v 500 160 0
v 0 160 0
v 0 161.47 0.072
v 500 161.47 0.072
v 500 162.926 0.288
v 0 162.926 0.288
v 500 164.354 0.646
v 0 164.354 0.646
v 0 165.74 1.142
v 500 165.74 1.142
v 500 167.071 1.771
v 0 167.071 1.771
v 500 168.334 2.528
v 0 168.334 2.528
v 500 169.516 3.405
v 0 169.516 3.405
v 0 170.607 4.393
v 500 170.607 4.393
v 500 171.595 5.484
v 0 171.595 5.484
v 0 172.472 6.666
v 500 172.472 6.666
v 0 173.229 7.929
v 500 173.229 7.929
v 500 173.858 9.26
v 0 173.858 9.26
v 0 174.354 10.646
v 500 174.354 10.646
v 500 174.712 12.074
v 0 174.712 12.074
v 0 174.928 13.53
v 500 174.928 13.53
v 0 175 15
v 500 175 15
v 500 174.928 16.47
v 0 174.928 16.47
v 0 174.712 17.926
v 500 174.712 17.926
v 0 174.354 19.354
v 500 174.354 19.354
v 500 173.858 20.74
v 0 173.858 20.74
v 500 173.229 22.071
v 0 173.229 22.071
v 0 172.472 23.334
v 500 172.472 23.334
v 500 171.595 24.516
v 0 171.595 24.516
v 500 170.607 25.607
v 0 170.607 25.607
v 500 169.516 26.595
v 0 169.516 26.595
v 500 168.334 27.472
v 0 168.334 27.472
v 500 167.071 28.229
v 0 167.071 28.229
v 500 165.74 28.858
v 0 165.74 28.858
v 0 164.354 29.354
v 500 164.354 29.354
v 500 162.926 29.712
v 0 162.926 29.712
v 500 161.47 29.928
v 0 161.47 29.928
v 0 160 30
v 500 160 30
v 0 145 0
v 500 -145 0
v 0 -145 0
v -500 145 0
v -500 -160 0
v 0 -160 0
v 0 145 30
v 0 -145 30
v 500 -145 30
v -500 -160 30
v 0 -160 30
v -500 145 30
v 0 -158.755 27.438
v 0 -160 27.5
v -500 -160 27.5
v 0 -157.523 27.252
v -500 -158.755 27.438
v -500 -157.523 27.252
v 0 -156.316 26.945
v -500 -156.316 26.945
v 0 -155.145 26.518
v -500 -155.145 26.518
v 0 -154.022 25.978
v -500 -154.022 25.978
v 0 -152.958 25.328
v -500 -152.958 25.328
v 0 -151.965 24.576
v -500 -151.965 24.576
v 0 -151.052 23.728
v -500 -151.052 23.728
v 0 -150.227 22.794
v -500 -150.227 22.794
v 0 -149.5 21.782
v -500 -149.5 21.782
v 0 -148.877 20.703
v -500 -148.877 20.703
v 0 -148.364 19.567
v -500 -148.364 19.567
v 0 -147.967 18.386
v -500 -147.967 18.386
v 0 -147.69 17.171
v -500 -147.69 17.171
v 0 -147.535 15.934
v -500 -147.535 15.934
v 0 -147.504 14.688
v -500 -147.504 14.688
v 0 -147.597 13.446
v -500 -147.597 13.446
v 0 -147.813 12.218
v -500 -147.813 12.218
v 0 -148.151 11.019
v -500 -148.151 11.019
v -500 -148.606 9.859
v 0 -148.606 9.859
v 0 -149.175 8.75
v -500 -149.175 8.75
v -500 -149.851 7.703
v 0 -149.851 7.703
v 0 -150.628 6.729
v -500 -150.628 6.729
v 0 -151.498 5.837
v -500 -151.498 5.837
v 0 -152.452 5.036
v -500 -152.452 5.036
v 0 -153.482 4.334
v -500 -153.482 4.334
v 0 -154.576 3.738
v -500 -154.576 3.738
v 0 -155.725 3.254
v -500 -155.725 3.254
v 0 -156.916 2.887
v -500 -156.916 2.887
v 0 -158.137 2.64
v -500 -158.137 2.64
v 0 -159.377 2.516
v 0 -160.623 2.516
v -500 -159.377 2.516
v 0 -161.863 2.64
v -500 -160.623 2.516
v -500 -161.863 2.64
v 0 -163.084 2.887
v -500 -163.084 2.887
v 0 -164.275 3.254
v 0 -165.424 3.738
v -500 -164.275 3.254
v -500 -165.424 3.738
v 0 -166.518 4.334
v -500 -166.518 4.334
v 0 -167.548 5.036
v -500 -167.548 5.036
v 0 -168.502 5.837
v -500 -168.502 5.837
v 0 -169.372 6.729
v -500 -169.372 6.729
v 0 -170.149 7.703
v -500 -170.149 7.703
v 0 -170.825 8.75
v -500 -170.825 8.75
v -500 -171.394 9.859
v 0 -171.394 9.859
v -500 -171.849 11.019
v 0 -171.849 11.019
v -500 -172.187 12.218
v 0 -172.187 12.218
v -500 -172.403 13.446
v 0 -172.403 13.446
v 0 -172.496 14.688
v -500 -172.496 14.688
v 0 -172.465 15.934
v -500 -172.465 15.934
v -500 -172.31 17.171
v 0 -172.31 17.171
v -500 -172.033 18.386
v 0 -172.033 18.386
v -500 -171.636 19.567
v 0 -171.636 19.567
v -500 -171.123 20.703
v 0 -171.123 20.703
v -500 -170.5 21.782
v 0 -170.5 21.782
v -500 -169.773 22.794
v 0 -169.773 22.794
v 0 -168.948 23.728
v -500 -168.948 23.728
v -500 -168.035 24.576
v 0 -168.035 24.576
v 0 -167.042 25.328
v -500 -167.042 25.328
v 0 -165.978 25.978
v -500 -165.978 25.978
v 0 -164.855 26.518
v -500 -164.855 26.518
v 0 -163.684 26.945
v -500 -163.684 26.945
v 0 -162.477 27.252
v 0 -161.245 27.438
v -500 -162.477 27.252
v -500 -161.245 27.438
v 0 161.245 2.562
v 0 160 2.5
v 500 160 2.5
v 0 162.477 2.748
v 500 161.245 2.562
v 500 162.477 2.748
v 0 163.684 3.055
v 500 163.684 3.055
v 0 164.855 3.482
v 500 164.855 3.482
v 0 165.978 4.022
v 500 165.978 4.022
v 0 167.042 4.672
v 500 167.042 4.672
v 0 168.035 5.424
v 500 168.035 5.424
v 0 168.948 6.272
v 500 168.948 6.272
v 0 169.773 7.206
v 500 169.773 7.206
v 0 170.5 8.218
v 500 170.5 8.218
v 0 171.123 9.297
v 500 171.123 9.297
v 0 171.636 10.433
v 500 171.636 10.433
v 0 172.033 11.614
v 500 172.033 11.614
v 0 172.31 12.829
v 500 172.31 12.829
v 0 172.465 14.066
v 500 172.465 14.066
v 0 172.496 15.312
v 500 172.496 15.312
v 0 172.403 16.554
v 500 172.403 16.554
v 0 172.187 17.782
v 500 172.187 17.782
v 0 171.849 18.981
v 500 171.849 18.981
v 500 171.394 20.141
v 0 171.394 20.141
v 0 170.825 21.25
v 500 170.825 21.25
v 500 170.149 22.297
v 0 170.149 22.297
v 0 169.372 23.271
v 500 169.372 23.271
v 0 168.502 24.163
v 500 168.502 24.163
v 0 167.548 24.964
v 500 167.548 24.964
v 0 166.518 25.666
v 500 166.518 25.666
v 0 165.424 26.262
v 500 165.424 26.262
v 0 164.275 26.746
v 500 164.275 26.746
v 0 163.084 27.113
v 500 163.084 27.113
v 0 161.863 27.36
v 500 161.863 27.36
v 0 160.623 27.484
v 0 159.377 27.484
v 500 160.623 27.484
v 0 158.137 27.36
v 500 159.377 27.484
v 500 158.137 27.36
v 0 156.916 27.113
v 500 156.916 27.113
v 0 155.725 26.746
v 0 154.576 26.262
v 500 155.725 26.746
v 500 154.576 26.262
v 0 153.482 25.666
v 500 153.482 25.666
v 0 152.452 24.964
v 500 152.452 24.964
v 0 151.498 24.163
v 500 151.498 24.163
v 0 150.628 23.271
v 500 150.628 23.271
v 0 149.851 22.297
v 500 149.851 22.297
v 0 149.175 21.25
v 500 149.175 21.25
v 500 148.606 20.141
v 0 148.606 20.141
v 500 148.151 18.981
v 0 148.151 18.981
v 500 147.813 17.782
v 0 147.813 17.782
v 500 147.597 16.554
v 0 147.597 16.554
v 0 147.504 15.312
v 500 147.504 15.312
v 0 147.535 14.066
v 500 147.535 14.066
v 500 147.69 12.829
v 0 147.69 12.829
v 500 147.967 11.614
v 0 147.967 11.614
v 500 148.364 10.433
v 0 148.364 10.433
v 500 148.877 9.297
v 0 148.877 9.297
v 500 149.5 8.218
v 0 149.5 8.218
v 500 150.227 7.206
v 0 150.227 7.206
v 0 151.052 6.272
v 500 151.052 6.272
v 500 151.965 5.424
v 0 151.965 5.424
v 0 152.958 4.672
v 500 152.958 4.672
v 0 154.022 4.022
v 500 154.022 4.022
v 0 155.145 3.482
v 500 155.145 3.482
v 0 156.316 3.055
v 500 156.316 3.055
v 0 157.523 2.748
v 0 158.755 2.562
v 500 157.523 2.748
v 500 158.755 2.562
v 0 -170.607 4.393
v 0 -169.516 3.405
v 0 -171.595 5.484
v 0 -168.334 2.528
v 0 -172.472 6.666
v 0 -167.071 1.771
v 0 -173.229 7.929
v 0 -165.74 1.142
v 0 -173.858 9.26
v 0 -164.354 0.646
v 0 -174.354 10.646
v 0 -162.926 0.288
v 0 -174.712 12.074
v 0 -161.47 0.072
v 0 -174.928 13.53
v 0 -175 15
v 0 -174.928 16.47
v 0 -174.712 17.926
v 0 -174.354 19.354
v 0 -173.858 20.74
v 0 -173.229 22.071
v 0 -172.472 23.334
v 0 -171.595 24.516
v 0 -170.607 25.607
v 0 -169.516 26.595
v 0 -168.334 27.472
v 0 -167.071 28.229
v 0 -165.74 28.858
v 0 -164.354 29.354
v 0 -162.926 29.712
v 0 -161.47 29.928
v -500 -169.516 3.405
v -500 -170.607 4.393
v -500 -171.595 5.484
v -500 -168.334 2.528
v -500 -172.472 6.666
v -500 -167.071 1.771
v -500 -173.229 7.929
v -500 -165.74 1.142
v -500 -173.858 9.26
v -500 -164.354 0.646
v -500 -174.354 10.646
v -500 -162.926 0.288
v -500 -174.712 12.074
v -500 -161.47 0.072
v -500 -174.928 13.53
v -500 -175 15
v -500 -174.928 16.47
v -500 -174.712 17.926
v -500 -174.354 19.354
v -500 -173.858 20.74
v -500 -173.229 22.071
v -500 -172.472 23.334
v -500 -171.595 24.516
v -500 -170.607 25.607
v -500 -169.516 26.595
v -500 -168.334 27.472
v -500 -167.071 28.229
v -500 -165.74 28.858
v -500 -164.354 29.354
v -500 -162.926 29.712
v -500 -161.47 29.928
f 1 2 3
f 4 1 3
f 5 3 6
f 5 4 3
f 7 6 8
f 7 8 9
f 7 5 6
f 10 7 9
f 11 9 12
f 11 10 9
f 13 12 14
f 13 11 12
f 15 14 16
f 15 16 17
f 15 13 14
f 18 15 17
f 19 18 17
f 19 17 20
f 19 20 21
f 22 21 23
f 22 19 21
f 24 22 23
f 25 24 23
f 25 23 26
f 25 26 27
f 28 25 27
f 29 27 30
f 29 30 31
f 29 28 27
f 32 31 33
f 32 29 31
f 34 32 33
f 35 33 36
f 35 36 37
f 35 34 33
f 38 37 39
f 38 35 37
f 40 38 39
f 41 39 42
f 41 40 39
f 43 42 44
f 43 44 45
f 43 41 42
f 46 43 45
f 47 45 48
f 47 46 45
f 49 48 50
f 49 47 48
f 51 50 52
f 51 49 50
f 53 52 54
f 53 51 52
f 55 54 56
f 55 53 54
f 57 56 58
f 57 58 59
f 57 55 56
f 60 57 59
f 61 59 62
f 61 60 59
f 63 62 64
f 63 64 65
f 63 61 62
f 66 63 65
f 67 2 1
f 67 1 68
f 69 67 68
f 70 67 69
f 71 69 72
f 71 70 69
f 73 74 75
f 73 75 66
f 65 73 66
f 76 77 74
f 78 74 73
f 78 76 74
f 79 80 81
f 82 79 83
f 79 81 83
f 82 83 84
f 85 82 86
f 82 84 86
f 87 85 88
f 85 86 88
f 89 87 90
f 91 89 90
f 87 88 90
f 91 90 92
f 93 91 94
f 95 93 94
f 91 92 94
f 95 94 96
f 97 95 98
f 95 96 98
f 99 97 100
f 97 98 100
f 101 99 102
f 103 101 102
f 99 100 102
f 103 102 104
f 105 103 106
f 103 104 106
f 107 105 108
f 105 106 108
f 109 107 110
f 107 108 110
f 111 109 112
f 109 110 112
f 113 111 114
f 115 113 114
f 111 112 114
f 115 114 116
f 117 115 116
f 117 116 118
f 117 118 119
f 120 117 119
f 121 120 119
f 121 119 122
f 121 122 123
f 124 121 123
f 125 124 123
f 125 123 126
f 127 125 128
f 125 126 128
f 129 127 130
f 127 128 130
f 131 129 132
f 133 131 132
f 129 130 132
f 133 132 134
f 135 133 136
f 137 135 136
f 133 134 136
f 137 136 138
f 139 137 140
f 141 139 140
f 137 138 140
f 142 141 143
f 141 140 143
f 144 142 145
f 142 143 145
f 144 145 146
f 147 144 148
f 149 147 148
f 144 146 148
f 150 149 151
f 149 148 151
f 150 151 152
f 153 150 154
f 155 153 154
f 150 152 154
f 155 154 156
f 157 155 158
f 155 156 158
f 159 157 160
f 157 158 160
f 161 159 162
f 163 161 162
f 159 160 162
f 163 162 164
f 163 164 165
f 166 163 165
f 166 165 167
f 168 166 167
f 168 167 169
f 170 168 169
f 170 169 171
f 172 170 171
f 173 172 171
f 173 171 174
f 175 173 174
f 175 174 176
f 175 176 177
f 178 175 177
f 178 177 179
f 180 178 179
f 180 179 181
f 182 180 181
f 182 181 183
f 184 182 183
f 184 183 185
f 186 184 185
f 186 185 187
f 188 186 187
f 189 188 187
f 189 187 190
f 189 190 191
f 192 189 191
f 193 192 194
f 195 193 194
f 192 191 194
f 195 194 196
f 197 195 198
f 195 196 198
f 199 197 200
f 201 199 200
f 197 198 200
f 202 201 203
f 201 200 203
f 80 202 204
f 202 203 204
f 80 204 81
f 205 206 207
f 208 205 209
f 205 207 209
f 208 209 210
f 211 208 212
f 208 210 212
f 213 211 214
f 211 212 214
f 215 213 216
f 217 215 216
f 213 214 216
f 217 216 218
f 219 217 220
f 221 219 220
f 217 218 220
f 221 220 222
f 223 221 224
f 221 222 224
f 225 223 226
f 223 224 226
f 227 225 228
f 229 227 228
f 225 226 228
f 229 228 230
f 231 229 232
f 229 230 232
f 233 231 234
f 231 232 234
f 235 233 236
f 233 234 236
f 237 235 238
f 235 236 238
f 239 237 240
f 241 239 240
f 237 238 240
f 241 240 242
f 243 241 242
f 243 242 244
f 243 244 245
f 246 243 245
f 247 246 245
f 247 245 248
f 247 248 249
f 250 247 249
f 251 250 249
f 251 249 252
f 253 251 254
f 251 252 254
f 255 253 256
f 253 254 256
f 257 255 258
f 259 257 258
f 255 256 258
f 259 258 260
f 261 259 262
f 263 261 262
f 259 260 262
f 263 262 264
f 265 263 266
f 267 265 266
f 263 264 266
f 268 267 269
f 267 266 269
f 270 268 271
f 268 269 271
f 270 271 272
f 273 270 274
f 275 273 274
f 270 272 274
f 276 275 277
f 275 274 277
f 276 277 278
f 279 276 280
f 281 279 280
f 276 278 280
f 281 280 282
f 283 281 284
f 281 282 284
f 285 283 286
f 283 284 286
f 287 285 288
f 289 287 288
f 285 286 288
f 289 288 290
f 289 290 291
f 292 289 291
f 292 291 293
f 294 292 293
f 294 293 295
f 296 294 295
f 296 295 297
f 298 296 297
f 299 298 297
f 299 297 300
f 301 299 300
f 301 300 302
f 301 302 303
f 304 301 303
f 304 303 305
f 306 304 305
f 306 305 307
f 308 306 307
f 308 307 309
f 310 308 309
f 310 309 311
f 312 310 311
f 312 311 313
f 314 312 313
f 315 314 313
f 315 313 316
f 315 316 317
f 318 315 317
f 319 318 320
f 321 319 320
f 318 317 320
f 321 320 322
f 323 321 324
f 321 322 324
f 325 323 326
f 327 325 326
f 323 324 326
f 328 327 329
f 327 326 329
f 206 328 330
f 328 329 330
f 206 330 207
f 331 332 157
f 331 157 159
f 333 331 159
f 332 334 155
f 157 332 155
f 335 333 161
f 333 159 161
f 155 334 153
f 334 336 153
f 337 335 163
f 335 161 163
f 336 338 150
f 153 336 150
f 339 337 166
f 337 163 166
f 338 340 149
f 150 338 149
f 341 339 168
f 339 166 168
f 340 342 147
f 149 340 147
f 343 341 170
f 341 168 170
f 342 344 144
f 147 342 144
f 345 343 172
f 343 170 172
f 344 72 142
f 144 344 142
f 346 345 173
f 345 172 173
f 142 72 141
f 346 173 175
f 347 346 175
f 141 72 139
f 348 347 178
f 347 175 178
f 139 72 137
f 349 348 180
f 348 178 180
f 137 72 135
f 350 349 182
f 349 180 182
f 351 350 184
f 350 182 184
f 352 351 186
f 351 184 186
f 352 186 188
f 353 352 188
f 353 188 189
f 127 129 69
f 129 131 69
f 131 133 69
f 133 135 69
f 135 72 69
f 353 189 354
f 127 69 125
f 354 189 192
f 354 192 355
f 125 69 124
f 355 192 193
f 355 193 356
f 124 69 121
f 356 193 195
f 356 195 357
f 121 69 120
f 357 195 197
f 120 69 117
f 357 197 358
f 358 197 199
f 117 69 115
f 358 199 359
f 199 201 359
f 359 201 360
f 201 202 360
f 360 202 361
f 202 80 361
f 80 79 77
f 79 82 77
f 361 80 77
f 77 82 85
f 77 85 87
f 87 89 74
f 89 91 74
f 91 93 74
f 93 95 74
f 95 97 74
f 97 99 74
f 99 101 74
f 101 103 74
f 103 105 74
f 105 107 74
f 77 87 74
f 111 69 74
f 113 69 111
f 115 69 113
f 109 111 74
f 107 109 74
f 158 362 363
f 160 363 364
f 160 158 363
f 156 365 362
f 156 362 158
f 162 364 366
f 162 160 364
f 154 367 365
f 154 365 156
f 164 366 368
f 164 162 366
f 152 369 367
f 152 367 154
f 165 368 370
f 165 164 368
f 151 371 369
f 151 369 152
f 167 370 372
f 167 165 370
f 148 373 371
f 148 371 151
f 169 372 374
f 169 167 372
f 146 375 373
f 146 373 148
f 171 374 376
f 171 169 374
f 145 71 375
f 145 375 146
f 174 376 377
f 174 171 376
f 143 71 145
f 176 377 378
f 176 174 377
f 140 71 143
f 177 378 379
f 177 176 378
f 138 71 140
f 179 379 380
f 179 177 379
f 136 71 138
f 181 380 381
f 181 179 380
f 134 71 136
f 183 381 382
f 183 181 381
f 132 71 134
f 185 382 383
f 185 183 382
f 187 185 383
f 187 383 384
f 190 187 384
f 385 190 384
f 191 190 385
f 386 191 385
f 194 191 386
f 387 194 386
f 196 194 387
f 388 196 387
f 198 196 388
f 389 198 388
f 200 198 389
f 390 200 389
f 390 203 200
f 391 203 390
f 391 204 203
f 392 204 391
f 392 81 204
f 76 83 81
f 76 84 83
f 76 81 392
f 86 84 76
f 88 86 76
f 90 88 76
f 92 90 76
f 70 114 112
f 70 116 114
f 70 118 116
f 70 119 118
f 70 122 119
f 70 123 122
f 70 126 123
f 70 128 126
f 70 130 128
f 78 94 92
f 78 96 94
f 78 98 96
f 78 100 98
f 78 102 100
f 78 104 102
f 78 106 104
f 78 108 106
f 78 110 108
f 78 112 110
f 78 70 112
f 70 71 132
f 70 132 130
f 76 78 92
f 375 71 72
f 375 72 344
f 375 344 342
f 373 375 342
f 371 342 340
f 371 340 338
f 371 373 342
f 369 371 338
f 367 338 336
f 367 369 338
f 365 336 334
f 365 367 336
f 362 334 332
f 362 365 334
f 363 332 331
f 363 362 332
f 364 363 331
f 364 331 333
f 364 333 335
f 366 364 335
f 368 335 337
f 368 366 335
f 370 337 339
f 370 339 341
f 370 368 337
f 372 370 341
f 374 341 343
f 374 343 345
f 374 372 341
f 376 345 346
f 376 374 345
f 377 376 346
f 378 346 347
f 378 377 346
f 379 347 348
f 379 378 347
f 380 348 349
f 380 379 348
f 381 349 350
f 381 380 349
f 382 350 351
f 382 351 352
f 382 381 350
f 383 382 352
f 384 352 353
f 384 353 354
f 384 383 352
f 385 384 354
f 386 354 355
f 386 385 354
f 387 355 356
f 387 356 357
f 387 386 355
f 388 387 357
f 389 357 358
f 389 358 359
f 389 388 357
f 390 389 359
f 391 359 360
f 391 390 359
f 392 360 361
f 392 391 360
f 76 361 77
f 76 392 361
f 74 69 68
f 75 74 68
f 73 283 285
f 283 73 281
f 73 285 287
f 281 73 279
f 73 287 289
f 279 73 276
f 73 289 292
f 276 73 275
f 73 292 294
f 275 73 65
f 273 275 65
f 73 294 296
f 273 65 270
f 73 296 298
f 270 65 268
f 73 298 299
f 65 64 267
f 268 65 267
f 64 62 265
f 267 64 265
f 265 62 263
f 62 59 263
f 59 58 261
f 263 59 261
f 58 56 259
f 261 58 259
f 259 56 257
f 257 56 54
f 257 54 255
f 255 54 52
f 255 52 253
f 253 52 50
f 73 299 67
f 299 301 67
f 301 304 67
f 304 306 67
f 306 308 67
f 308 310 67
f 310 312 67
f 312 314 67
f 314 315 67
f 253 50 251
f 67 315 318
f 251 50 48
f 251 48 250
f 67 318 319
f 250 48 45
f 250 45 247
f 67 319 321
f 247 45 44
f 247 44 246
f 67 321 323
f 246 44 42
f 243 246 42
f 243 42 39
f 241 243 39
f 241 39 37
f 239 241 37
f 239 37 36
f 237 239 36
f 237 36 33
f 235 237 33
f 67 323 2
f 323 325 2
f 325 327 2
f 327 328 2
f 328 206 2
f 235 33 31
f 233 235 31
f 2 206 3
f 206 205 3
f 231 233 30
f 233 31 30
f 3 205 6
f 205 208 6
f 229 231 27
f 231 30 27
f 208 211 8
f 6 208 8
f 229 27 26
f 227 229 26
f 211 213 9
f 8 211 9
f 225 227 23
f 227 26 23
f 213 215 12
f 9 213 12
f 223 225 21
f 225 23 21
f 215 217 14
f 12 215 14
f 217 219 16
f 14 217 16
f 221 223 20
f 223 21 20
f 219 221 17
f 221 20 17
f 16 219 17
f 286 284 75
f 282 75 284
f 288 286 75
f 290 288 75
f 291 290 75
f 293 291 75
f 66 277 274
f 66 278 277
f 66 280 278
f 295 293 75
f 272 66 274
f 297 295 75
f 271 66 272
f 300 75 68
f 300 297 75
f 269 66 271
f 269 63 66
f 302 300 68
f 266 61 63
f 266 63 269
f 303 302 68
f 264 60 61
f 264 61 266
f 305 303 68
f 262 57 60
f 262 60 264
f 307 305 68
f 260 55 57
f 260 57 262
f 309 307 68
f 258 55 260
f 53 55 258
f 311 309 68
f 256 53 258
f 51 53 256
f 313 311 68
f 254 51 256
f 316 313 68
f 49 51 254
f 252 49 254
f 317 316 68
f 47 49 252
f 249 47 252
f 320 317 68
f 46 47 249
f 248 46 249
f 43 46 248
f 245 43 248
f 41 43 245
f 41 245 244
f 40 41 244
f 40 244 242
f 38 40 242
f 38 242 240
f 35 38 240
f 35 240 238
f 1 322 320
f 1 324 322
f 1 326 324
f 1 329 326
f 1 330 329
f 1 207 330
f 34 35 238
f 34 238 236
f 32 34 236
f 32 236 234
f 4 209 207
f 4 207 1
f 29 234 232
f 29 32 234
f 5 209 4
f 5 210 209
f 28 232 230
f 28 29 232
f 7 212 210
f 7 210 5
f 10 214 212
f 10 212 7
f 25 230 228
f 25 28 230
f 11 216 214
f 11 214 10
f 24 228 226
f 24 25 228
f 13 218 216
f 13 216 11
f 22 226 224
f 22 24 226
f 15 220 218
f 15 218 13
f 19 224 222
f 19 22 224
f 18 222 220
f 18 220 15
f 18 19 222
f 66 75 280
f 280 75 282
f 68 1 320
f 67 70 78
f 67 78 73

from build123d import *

# Parameters (mm, degrees)
SKETCH1_W           = 1000
SKETCH1_H           = 290
BOSS_EXTRUDE1_DEPTH = 30
SKETCH2_R           = 15
SKETCH2_R_2         = 12.5
BOSS_EXTRUDE2_DEPTH = 500
SKETCH3_R           = 15
SKETCH3_R_2         = 12.5
BOSS_EXTRUDE3_DEPTH = 500


with BuildPart() as part:
    # Sketch1 → Boss-Extrude1 (new body)
    with BuildSketch(Plane.XY):
        Rectangle(SKETCH1_W, SKETCH1_H)
    extrude(amount=BOSS_EXTRUDE1_DEPTH)

    # Sketch2 → Boss-Extrude2 (add)
    with BuildSketch(Plane(origin=(500, 0, 0), x_dir=(0, 0, -1), z_dir=(1, 0, 0))):
        with Locations((-15, 160)):
            Circle(SKETCH2_R)
        with Locations((-15, 160)):
            Circle(SKETCH2_R_2, mode=Mode.SUBTRACT)
        with BuildLine():
            ThreePointArc((-15, 145), (-25.606601718, 149.393398282), (-30, 160))
            Line((-30, 160), (-30, 145))
            Line((-30, 145), (-15, 145))
        make_face()
        with BuildLine():
            Line((0, 145), (0, 160))
            ThreePointArc((0, 160), (-4.393398282, 149.393398282), (-15, 145))
            Line((-15, 145), (0, 145))
        make_face()
    extrude(amount=-BOSS_EXTRUDE2_DEPTH)

    # Sketch3 → Boss-Extrude3 (add)
    with BuildSketch(Plane.ZY.offset(500)):
        with BuildLine():
            Line((0, -145), (0, -160))
            ThreePointArc((0, -160), (4.393398282, -149.393398282), (15, -145))
            Line((15, -145), (0, -145))
        make_face()
        with Locations((15, -160)):
            Circle(SKETCH3_R)
        with Locations((15, -160)):
            Circle(SKETCH3_R_2, mode=Mode.SUBTRACT)
        with BuildLine():
            ThreePointArc((15, -145), (25.606601718, -149.393398282), (30, -160))
            Line((30, -160), (30, -145))
            Line((30, -145), (15, -145))
        make_face()
    extrude(amount=-BOSS_EXTRUDE3_DEPTH)


solid = part.part
